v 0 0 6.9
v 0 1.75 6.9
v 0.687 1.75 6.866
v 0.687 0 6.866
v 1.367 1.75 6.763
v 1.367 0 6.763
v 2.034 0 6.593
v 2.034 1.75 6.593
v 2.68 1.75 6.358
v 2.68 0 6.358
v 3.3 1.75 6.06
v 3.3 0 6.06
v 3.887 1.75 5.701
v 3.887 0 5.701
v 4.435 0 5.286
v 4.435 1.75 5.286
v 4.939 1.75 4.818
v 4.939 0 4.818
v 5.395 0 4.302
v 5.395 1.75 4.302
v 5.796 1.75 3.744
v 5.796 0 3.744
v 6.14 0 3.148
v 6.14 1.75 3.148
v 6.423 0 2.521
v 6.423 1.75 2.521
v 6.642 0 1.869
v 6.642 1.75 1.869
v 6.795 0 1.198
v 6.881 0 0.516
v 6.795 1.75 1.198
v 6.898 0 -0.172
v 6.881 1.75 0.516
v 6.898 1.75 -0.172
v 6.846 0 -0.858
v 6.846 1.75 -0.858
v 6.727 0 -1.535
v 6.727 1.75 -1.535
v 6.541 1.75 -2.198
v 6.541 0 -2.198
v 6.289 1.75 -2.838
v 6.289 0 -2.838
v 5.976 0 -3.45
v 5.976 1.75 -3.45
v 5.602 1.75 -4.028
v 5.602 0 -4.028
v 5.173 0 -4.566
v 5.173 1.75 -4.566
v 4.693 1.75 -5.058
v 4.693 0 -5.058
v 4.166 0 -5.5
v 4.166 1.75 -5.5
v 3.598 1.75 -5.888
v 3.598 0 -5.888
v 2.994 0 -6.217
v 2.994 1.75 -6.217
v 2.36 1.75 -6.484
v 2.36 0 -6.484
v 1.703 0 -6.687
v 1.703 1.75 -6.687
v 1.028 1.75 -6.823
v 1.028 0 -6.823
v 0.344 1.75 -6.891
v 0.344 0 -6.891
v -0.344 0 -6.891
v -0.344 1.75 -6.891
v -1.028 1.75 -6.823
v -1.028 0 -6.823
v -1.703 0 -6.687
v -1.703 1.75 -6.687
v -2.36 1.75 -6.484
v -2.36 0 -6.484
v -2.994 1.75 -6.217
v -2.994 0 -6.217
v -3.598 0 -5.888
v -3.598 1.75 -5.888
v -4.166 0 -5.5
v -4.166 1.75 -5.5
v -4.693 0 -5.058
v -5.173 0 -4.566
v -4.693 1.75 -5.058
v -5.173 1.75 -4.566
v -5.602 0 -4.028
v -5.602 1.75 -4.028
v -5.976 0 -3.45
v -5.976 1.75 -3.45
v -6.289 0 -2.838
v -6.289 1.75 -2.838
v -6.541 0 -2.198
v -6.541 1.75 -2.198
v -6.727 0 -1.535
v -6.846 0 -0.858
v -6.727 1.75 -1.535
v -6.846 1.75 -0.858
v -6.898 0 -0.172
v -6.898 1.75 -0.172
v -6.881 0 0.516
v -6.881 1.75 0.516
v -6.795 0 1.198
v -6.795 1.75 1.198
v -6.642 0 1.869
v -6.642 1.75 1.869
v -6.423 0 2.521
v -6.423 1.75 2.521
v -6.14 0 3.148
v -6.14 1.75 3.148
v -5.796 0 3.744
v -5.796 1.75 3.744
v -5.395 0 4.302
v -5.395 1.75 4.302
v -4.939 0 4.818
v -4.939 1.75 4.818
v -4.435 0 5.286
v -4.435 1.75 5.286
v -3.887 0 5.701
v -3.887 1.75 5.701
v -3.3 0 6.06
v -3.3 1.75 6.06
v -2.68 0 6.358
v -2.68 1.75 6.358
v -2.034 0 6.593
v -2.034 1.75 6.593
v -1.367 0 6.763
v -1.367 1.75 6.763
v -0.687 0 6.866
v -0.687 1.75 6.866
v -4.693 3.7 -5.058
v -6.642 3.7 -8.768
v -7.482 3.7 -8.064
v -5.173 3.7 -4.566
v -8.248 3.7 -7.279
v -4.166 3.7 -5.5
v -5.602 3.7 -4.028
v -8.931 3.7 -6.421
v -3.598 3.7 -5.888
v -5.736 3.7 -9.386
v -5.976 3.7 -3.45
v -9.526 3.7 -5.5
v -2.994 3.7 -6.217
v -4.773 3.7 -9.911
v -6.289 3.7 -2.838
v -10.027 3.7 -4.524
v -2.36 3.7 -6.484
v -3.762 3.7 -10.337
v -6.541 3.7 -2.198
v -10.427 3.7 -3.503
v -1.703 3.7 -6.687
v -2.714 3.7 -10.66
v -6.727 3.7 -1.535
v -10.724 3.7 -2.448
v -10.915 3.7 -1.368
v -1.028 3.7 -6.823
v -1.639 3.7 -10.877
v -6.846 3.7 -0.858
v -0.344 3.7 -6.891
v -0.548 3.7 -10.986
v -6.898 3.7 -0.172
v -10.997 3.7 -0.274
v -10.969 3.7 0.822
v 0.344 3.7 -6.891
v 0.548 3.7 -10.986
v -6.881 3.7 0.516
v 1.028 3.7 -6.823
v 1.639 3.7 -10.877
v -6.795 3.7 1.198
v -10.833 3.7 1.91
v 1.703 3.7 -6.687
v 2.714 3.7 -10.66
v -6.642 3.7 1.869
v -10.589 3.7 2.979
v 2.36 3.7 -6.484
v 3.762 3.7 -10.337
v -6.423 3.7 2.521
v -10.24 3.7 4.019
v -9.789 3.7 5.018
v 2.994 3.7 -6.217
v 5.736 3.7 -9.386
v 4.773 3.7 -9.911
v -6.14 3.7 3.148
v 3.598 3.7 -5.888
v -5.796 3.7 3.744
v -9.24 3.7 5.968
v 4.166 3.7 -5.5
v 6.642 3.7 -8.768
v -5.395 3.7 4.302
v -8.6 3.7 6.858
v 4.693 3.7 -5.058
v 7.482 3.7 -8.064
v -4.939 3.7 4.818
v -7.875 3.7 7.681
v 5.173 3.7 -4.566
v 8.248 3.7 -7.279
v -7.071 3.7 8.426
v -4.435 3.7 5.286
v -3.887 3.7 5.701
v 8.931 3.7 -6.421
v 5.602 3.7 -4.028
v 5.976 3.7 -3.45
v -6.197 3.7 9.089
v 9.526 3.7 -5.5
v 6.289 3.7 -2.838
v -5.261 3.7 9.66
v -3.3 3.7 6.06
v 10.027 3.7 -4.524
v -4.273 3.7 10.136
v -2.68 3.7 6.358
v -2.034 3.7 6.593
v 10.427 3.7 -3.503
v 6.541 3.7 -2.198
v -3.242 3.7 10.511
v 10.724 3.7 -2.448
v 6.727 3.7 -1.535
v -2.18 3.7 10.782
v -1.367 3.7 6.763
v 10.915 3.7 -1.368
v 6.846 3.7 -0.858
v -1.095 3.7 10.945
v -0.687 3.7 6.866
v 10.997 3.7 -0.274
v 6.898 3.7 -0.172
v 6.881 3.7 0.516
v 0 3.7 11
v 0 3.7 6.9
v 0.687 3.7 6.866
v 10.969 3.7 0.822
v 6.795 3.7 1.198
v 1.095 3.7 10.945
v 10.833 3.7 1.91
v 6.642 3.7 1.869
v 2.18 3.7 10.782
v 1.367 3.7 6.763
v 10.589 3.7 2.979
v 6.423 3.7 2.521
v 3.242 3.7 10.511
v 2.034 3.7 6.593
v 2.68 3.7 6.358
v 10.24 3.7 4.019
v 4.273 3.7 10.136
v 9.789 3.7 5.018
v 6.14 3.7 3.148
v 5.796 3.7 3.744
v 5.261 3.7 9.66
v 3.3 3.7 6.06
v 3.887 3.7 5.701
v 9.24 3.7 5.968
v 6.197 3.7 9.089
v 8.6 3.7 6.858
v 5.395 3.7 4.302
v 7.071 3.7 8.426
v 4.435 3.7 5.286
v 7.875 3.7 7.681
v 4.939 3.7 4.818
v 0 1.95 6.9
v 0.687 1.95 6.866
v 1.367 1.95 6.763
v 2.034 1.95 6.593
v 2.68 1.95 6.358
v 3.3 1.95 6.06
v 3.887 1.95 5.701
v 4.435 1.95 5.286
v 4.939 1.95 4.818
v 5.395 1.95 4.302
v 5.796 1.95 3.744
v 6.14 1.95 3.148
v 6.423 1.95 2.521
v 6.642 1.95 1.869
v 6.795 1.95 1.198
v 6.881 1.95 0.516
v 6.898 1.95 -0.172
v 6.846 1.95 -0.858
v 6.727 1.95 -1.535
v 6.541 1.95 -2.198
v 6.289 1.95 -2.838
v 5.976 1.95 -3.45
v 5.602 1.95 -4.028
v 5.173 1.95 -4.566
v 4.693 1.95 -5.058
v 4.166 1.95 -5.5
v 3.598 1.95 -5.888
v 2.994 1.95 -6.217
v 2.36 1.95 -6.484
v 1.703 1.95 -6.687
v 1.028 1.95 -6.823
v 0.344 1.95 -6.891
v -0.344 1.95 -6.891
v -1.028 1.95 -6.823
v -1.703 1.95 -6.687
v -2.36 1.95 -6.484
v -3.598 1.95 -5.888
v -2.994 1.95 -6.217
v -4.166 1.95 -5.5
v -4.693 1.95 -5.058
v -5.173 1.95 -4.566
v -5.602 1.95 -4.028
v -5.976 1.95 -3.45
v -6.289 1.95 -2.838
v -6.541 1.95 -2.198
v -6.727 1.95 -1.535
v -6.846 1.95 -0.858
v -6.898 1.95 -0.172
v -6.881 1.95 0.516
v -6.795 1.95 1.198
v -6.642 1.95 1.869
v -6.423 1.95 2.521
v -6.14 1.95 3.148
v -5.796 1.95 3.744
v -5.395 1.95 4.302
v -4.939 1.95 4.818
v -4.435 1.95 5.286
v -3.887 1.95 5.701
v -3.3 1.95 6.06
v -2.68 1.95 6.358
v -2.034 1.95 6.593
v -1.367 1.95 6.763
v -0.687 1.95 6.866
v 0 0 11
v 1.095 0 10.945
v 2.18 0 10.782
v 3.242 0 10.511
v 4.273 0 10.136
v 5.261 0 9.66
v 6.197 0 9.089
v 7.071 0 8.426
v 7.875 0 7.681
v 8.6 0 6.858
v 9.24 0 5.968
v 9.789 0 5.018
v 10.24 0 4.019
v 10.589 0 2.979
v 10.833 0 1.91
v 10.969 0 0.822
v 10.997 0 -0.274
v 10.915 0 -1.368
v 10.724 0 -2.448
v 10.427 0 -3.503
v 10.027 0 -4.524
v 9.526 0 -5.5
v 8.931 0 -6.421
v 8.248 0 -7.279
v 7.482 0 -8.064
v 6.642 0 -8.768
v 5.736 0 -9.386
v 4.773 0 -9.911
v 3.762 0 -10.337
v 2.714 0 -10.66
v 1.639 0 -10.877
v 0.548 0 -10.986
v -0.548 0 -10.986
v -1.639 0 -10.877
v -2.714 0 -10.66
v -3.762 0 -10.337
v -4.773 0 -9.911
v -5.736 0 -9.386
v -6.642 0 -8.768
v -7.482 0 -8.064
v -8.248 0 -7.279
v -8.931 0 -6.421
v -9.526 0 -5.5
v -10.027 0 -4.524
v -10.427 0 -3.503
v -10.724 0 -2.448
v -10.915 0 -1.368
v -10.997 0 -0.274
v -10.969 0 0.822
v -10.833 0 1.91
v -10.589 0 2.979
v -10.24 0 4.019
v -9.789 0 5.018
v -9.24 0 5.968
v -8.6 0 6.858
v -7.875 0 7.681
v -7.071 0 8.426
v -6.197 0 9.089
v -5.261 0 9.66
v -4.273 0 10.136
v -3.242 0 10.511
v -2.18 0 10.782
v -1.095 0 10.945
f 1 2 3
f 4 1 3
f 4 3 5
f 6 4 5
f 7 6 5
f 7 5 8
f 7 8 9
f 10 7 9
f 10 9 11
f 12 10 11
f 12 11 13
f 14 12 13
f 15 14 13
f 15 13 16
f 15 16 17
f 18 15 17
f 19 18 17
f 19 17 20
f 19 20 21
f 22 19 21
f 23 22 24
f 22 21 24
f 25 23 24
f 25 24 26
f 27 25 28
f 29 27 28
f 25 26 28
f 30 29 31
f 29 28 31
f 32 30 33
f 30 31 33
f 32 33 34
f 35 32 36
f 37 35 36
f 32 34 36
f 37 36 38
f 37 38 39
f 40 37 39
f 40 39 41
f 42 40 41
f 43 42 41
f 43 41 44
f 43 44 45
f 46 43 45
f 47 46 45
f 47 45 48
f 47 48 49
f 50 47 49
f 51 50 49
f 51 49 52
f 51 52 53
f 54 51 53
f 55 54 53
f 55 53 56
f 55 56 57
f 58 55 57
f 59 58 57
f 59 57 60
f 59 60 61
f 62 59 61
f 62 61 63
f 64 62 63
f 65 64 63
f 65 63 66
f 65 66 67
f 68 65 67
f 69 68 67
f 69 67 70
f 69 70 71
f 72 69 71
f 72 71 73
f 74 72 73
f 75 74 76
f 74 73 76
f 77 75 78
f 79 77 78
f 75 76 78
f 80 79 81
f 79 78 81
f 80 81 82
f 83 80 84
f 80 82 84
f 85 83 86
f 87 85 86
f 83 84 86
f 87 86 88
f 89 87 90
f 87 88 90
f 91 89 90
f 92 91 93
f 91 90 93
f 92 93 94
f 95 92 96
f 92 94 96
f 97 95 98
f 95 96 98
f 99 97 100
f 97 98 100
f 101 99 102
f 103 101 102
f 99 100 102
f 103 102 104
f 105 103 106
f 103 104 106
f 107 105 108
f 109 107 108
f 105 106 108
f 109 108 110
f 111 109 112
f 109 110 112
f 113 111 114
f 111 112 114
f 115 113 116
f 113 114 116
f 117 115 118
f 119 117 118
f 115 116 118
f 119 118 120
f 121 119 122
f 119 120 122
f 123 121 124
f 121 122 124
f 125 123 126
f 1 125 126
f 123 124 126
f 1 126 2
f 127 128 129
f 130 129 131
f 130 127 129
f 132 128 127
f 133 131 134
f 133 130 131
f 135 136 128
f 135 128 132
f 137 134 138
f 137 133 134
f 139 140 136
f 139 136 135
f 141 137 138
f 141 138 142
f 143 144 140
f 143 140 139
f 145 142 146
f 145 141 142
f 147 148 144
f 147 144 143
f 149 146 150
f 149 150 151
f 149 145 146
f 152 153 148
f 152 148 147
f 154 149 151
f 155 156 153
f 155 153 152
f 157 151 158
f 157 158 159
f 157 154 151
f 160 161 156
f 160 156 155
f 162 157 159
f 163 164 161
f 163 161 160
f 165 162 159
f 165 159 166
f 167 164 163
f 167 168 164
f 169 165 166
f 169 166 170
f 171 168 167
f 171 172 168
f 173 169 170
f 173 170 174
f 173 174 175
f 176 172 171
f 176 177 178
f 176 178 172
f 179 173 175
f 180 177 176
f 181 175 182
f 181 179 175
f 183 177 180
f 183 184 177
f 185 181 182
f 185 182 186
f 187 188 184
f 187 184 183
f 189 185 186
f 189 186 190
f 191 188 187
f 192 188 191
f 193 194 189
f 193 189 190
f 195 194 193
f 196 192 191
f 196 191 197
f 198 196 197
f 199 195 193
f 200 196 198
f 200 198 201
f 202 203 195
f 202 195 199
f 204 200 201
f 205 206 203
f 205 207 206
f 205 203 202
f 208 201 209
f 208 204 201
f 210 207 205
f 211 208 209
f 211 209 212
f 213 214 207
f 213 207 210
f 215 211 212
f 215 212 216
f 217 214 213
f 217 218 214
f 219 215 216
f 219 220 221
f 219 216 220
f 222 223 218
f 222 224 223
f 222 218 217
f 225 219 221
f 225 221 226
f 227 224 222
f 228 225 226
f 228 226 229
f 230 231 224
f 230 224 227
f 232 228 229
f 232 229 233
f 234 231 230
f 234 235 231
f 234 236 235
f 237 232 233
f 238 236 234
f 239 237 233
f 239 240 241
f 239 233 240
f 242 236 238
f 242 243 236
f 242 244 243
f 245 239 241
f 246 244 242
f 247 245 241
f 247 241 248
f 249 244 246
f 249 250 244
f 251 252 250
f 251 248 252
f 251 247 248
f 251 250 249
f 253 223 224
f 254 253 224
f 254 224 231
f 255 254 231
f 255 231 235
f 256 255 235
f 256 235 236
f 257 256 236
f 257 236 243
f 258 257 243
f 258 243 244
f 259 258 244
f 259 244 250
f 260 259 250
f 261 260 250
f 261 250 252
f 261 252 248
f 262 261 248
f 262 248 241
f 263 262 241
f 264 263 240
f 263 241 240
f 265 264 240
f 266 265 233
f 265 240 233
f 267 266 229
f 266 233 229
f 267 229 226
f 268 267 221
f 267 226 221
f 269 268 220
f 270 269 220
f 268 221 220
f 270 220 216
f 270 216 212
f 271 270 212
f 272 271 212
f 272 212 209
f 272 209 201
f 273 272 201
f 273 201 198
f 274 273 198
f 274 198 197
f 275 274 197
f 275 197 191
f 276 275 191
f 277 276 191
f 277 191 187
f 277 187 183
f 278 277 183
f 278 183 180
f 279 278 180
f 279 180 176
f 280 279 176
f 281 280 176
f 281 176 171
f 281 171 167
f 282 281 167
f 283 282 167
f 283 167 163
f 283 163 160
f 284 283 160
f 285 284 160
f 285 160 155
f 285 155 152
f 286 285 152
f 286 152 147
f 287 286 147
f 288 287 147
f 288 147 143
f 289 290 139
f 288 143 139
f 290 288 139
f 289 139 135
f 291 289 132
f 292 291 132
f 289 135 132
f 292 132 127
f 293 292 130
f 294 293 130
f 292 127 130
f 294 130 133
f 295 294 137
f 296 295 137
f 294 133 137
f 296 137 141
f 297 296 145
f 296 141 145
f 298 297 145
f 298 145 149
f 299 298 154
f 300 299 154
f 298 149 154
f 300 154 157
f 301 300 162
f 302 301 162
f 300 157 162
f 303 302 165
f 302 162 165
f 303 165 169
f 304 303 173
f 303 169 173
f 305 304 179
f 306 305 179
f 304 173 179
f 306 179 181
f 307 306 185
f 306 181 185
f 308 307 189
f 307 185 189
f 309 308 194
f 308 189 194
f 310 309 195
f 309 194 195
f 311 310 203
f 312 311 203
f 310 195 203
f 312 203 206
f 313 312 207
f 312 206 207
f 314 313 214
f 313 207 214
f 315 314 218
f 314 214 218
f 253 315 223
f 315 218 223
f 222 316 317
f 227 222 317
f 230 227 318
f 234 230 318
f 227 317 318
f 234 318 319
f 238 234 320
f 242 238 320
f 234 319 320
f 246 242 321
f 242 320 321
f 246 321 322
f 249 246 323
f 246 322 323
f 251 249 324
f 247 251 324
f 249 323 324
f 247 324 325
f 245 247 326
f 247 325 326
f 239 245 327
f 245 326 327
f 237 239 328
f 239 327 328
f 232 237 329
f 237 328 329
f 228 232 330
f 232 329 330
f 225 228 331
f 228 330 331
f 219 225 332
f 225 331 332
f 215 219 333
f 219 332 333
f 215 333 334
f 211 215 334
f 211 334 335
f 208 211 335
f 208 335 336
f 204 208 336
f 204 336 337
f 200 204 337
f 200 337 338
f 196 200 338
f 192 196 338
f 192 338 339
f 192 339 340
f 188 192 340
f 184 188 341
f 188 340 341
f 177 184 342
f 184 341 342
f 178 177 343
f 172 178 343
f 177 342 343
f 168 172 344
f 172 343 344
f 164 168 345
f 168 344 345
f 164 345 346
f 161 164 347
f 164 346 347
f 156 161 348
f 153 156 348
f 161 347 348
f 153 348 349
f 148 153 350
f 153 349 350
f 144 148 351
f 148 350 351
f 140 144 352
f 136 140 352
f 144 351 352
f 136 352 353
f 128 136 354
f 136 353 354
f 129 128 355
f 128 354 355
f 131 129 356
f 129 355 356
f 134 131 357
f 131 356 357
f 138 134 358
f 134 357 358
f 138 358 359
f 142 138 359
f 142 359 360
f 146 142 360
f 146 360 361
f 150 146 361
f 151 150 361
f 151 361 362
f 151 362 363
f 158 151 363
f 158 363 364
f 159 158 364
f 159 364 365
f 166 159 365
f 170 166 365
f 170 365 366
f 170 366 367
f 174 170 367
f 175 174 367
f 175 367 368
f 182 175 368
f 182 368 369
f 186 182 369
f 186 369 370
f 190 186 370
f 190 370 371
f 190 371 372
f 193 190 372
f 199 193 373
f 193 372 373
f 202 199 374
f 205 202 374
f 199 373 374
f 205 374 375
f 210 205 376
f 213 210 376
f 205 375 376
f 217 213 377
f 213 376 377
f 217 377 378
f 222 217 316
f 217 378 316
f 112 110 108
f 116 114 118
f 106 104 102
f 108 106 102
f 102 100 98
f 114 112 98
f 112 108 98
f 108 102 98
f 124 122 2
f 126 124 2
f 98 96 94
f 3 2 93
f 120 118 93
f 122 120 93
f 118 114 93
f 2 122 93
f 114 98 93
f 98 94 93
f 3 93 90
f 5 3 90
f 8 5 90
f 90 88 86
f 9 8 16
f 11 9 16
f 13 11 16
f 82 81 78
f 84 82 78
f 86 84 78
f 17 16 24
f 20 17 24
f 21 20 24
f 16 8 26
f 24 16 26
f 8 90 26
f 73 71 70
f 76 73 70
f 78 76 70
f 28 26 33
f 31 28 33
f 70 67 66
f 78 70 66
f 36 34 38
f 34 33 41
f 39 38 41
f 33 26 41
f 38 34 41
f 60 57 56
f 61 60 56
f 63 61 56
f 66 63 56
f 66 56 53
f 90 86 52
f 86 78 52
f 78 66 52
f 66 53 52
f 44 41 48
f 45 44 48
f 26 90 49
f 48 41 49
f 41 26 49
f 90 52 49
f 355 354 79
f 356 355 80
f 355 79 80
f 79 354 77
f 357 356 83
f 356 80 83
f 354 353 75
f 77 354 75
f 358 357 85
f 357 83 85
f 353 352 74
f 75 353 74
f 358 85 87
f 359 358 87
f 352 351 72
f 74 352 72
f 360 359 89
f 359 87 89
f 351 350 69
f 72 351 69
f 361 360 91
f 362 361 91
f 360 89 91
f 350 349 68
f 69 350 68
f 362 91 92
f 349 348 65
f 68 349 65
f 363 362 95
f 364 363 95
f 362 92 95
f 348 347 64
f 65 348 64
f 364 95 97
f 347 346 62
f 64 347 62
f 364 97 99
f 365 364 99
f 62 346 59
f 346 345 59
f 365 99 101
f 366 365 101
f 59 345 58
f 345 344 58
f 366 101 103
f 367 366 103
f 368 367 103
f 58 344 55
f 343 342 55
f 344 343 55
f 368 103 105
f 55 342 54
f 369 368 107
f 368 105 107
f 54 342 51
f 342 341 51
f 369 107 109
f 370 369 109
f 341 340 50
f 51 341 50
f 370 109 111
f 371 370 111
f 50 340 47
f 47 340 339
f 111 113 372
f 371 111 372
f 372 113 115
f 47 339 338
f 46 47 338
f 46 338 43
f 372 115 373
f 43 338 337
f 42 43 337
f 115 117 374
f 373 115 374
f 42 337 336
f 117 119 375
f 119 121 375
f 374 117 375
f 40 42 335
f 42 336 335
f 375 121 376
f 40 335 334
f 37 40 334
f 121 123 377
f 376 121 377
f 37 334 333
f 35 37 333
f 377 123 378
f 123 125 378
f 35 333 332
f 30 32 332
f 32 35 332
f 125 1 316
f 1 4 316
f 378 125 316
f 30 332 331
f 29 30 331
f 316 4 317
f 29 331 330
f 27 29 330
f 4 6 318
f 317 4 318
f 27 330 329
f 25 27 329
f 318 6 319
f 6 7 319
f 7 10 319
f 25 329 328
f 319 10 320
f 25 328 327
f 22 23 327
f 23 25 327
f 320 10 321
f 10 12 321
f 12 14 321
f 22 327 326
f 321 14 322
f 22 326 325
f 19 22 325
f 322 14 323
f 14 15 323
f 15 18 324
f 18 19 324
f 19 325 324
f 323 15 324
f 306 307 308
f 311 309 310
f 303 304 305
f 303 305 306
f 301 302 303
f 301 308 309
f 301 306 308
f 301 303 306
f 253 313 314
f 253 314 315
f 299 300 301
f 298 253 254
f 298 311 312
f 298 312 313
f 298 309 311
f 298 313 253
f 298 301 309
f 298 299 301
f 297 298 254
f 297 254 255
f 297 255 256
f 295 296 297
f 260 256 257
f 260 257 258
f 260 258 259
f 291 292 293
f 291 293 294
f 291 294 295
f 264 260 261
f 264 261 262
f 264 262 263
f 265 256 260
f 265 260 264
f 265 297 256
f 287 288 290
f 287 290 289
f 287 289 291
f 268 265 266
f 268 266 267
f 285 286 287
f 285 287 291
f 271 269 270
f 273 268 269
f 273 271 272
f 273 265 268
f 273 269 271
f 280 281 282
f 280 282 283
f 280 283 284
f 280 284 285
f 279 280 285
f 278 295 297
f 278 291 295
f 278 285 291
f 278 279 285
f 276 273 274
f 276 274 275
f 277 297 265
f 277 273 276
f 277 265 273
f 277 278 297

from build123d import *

# Parameters (mm, degrees)
SKETCH1_R                = 11
BOSS_EXTRUDE1_DEPTH      = 3.7
SKETCH2_R                = 6.9
CUT_EXTRUDE1_DEPTH       = 3.7
BOSS_EXTRUDE2_DEPTH      = 0.1
BOSS_EXTRUDE2_DEPTH_BACK = 0.1
SKETCH3_R                = 8.700899362


with BuildPart() as part:
    # Sketch1 → Boss-Extrude1 (new body)
    with BuildSketch(Plane(origin=(0, 0, 0), x_dir=(1, 0, 0), z_dir=(0, 1, 0))):
        with Locations(Location((0, 0, 0), (0, 0, 270))):
            Circle(SKETCH1_R)
    extrude(amount=BOSS_EXTRUDE1_DEPTH)

    # Sketch2 → Cut-Extrude1 (cut)
    with BuildSketch(Plane(origin=(0, 3.7, 0), x_dir=(1, 0, 0), z_dir=(0, 1, 0))):
        with Locations(Location((0, 0, 0), (0, 0, 270))):
            Circle(SKETCH2_R)
    extrude(amount=-CUT_EXTRUDE1_DEPTH, mode=Mode.SUBTRACT)

    # Sketch3 → Boss-Extrude2 (add, two sides: drawn at the far end of the back side and taken through both)
    with BuildSketch(Plane(origin=(0, 1.85, 0), x_dir=(1, 0, 0), z_dir=(0, 1, 0)).offset(-BOSS_EXTRUDE2_DEPTH_BACK)):
        Circle(SKETCH3_R)
    extrude(amount=BOSS_EXTRUDE2_DEPTH + BOSS_EXTRUDE2_DEPTH_BACK)


solid = part.part
